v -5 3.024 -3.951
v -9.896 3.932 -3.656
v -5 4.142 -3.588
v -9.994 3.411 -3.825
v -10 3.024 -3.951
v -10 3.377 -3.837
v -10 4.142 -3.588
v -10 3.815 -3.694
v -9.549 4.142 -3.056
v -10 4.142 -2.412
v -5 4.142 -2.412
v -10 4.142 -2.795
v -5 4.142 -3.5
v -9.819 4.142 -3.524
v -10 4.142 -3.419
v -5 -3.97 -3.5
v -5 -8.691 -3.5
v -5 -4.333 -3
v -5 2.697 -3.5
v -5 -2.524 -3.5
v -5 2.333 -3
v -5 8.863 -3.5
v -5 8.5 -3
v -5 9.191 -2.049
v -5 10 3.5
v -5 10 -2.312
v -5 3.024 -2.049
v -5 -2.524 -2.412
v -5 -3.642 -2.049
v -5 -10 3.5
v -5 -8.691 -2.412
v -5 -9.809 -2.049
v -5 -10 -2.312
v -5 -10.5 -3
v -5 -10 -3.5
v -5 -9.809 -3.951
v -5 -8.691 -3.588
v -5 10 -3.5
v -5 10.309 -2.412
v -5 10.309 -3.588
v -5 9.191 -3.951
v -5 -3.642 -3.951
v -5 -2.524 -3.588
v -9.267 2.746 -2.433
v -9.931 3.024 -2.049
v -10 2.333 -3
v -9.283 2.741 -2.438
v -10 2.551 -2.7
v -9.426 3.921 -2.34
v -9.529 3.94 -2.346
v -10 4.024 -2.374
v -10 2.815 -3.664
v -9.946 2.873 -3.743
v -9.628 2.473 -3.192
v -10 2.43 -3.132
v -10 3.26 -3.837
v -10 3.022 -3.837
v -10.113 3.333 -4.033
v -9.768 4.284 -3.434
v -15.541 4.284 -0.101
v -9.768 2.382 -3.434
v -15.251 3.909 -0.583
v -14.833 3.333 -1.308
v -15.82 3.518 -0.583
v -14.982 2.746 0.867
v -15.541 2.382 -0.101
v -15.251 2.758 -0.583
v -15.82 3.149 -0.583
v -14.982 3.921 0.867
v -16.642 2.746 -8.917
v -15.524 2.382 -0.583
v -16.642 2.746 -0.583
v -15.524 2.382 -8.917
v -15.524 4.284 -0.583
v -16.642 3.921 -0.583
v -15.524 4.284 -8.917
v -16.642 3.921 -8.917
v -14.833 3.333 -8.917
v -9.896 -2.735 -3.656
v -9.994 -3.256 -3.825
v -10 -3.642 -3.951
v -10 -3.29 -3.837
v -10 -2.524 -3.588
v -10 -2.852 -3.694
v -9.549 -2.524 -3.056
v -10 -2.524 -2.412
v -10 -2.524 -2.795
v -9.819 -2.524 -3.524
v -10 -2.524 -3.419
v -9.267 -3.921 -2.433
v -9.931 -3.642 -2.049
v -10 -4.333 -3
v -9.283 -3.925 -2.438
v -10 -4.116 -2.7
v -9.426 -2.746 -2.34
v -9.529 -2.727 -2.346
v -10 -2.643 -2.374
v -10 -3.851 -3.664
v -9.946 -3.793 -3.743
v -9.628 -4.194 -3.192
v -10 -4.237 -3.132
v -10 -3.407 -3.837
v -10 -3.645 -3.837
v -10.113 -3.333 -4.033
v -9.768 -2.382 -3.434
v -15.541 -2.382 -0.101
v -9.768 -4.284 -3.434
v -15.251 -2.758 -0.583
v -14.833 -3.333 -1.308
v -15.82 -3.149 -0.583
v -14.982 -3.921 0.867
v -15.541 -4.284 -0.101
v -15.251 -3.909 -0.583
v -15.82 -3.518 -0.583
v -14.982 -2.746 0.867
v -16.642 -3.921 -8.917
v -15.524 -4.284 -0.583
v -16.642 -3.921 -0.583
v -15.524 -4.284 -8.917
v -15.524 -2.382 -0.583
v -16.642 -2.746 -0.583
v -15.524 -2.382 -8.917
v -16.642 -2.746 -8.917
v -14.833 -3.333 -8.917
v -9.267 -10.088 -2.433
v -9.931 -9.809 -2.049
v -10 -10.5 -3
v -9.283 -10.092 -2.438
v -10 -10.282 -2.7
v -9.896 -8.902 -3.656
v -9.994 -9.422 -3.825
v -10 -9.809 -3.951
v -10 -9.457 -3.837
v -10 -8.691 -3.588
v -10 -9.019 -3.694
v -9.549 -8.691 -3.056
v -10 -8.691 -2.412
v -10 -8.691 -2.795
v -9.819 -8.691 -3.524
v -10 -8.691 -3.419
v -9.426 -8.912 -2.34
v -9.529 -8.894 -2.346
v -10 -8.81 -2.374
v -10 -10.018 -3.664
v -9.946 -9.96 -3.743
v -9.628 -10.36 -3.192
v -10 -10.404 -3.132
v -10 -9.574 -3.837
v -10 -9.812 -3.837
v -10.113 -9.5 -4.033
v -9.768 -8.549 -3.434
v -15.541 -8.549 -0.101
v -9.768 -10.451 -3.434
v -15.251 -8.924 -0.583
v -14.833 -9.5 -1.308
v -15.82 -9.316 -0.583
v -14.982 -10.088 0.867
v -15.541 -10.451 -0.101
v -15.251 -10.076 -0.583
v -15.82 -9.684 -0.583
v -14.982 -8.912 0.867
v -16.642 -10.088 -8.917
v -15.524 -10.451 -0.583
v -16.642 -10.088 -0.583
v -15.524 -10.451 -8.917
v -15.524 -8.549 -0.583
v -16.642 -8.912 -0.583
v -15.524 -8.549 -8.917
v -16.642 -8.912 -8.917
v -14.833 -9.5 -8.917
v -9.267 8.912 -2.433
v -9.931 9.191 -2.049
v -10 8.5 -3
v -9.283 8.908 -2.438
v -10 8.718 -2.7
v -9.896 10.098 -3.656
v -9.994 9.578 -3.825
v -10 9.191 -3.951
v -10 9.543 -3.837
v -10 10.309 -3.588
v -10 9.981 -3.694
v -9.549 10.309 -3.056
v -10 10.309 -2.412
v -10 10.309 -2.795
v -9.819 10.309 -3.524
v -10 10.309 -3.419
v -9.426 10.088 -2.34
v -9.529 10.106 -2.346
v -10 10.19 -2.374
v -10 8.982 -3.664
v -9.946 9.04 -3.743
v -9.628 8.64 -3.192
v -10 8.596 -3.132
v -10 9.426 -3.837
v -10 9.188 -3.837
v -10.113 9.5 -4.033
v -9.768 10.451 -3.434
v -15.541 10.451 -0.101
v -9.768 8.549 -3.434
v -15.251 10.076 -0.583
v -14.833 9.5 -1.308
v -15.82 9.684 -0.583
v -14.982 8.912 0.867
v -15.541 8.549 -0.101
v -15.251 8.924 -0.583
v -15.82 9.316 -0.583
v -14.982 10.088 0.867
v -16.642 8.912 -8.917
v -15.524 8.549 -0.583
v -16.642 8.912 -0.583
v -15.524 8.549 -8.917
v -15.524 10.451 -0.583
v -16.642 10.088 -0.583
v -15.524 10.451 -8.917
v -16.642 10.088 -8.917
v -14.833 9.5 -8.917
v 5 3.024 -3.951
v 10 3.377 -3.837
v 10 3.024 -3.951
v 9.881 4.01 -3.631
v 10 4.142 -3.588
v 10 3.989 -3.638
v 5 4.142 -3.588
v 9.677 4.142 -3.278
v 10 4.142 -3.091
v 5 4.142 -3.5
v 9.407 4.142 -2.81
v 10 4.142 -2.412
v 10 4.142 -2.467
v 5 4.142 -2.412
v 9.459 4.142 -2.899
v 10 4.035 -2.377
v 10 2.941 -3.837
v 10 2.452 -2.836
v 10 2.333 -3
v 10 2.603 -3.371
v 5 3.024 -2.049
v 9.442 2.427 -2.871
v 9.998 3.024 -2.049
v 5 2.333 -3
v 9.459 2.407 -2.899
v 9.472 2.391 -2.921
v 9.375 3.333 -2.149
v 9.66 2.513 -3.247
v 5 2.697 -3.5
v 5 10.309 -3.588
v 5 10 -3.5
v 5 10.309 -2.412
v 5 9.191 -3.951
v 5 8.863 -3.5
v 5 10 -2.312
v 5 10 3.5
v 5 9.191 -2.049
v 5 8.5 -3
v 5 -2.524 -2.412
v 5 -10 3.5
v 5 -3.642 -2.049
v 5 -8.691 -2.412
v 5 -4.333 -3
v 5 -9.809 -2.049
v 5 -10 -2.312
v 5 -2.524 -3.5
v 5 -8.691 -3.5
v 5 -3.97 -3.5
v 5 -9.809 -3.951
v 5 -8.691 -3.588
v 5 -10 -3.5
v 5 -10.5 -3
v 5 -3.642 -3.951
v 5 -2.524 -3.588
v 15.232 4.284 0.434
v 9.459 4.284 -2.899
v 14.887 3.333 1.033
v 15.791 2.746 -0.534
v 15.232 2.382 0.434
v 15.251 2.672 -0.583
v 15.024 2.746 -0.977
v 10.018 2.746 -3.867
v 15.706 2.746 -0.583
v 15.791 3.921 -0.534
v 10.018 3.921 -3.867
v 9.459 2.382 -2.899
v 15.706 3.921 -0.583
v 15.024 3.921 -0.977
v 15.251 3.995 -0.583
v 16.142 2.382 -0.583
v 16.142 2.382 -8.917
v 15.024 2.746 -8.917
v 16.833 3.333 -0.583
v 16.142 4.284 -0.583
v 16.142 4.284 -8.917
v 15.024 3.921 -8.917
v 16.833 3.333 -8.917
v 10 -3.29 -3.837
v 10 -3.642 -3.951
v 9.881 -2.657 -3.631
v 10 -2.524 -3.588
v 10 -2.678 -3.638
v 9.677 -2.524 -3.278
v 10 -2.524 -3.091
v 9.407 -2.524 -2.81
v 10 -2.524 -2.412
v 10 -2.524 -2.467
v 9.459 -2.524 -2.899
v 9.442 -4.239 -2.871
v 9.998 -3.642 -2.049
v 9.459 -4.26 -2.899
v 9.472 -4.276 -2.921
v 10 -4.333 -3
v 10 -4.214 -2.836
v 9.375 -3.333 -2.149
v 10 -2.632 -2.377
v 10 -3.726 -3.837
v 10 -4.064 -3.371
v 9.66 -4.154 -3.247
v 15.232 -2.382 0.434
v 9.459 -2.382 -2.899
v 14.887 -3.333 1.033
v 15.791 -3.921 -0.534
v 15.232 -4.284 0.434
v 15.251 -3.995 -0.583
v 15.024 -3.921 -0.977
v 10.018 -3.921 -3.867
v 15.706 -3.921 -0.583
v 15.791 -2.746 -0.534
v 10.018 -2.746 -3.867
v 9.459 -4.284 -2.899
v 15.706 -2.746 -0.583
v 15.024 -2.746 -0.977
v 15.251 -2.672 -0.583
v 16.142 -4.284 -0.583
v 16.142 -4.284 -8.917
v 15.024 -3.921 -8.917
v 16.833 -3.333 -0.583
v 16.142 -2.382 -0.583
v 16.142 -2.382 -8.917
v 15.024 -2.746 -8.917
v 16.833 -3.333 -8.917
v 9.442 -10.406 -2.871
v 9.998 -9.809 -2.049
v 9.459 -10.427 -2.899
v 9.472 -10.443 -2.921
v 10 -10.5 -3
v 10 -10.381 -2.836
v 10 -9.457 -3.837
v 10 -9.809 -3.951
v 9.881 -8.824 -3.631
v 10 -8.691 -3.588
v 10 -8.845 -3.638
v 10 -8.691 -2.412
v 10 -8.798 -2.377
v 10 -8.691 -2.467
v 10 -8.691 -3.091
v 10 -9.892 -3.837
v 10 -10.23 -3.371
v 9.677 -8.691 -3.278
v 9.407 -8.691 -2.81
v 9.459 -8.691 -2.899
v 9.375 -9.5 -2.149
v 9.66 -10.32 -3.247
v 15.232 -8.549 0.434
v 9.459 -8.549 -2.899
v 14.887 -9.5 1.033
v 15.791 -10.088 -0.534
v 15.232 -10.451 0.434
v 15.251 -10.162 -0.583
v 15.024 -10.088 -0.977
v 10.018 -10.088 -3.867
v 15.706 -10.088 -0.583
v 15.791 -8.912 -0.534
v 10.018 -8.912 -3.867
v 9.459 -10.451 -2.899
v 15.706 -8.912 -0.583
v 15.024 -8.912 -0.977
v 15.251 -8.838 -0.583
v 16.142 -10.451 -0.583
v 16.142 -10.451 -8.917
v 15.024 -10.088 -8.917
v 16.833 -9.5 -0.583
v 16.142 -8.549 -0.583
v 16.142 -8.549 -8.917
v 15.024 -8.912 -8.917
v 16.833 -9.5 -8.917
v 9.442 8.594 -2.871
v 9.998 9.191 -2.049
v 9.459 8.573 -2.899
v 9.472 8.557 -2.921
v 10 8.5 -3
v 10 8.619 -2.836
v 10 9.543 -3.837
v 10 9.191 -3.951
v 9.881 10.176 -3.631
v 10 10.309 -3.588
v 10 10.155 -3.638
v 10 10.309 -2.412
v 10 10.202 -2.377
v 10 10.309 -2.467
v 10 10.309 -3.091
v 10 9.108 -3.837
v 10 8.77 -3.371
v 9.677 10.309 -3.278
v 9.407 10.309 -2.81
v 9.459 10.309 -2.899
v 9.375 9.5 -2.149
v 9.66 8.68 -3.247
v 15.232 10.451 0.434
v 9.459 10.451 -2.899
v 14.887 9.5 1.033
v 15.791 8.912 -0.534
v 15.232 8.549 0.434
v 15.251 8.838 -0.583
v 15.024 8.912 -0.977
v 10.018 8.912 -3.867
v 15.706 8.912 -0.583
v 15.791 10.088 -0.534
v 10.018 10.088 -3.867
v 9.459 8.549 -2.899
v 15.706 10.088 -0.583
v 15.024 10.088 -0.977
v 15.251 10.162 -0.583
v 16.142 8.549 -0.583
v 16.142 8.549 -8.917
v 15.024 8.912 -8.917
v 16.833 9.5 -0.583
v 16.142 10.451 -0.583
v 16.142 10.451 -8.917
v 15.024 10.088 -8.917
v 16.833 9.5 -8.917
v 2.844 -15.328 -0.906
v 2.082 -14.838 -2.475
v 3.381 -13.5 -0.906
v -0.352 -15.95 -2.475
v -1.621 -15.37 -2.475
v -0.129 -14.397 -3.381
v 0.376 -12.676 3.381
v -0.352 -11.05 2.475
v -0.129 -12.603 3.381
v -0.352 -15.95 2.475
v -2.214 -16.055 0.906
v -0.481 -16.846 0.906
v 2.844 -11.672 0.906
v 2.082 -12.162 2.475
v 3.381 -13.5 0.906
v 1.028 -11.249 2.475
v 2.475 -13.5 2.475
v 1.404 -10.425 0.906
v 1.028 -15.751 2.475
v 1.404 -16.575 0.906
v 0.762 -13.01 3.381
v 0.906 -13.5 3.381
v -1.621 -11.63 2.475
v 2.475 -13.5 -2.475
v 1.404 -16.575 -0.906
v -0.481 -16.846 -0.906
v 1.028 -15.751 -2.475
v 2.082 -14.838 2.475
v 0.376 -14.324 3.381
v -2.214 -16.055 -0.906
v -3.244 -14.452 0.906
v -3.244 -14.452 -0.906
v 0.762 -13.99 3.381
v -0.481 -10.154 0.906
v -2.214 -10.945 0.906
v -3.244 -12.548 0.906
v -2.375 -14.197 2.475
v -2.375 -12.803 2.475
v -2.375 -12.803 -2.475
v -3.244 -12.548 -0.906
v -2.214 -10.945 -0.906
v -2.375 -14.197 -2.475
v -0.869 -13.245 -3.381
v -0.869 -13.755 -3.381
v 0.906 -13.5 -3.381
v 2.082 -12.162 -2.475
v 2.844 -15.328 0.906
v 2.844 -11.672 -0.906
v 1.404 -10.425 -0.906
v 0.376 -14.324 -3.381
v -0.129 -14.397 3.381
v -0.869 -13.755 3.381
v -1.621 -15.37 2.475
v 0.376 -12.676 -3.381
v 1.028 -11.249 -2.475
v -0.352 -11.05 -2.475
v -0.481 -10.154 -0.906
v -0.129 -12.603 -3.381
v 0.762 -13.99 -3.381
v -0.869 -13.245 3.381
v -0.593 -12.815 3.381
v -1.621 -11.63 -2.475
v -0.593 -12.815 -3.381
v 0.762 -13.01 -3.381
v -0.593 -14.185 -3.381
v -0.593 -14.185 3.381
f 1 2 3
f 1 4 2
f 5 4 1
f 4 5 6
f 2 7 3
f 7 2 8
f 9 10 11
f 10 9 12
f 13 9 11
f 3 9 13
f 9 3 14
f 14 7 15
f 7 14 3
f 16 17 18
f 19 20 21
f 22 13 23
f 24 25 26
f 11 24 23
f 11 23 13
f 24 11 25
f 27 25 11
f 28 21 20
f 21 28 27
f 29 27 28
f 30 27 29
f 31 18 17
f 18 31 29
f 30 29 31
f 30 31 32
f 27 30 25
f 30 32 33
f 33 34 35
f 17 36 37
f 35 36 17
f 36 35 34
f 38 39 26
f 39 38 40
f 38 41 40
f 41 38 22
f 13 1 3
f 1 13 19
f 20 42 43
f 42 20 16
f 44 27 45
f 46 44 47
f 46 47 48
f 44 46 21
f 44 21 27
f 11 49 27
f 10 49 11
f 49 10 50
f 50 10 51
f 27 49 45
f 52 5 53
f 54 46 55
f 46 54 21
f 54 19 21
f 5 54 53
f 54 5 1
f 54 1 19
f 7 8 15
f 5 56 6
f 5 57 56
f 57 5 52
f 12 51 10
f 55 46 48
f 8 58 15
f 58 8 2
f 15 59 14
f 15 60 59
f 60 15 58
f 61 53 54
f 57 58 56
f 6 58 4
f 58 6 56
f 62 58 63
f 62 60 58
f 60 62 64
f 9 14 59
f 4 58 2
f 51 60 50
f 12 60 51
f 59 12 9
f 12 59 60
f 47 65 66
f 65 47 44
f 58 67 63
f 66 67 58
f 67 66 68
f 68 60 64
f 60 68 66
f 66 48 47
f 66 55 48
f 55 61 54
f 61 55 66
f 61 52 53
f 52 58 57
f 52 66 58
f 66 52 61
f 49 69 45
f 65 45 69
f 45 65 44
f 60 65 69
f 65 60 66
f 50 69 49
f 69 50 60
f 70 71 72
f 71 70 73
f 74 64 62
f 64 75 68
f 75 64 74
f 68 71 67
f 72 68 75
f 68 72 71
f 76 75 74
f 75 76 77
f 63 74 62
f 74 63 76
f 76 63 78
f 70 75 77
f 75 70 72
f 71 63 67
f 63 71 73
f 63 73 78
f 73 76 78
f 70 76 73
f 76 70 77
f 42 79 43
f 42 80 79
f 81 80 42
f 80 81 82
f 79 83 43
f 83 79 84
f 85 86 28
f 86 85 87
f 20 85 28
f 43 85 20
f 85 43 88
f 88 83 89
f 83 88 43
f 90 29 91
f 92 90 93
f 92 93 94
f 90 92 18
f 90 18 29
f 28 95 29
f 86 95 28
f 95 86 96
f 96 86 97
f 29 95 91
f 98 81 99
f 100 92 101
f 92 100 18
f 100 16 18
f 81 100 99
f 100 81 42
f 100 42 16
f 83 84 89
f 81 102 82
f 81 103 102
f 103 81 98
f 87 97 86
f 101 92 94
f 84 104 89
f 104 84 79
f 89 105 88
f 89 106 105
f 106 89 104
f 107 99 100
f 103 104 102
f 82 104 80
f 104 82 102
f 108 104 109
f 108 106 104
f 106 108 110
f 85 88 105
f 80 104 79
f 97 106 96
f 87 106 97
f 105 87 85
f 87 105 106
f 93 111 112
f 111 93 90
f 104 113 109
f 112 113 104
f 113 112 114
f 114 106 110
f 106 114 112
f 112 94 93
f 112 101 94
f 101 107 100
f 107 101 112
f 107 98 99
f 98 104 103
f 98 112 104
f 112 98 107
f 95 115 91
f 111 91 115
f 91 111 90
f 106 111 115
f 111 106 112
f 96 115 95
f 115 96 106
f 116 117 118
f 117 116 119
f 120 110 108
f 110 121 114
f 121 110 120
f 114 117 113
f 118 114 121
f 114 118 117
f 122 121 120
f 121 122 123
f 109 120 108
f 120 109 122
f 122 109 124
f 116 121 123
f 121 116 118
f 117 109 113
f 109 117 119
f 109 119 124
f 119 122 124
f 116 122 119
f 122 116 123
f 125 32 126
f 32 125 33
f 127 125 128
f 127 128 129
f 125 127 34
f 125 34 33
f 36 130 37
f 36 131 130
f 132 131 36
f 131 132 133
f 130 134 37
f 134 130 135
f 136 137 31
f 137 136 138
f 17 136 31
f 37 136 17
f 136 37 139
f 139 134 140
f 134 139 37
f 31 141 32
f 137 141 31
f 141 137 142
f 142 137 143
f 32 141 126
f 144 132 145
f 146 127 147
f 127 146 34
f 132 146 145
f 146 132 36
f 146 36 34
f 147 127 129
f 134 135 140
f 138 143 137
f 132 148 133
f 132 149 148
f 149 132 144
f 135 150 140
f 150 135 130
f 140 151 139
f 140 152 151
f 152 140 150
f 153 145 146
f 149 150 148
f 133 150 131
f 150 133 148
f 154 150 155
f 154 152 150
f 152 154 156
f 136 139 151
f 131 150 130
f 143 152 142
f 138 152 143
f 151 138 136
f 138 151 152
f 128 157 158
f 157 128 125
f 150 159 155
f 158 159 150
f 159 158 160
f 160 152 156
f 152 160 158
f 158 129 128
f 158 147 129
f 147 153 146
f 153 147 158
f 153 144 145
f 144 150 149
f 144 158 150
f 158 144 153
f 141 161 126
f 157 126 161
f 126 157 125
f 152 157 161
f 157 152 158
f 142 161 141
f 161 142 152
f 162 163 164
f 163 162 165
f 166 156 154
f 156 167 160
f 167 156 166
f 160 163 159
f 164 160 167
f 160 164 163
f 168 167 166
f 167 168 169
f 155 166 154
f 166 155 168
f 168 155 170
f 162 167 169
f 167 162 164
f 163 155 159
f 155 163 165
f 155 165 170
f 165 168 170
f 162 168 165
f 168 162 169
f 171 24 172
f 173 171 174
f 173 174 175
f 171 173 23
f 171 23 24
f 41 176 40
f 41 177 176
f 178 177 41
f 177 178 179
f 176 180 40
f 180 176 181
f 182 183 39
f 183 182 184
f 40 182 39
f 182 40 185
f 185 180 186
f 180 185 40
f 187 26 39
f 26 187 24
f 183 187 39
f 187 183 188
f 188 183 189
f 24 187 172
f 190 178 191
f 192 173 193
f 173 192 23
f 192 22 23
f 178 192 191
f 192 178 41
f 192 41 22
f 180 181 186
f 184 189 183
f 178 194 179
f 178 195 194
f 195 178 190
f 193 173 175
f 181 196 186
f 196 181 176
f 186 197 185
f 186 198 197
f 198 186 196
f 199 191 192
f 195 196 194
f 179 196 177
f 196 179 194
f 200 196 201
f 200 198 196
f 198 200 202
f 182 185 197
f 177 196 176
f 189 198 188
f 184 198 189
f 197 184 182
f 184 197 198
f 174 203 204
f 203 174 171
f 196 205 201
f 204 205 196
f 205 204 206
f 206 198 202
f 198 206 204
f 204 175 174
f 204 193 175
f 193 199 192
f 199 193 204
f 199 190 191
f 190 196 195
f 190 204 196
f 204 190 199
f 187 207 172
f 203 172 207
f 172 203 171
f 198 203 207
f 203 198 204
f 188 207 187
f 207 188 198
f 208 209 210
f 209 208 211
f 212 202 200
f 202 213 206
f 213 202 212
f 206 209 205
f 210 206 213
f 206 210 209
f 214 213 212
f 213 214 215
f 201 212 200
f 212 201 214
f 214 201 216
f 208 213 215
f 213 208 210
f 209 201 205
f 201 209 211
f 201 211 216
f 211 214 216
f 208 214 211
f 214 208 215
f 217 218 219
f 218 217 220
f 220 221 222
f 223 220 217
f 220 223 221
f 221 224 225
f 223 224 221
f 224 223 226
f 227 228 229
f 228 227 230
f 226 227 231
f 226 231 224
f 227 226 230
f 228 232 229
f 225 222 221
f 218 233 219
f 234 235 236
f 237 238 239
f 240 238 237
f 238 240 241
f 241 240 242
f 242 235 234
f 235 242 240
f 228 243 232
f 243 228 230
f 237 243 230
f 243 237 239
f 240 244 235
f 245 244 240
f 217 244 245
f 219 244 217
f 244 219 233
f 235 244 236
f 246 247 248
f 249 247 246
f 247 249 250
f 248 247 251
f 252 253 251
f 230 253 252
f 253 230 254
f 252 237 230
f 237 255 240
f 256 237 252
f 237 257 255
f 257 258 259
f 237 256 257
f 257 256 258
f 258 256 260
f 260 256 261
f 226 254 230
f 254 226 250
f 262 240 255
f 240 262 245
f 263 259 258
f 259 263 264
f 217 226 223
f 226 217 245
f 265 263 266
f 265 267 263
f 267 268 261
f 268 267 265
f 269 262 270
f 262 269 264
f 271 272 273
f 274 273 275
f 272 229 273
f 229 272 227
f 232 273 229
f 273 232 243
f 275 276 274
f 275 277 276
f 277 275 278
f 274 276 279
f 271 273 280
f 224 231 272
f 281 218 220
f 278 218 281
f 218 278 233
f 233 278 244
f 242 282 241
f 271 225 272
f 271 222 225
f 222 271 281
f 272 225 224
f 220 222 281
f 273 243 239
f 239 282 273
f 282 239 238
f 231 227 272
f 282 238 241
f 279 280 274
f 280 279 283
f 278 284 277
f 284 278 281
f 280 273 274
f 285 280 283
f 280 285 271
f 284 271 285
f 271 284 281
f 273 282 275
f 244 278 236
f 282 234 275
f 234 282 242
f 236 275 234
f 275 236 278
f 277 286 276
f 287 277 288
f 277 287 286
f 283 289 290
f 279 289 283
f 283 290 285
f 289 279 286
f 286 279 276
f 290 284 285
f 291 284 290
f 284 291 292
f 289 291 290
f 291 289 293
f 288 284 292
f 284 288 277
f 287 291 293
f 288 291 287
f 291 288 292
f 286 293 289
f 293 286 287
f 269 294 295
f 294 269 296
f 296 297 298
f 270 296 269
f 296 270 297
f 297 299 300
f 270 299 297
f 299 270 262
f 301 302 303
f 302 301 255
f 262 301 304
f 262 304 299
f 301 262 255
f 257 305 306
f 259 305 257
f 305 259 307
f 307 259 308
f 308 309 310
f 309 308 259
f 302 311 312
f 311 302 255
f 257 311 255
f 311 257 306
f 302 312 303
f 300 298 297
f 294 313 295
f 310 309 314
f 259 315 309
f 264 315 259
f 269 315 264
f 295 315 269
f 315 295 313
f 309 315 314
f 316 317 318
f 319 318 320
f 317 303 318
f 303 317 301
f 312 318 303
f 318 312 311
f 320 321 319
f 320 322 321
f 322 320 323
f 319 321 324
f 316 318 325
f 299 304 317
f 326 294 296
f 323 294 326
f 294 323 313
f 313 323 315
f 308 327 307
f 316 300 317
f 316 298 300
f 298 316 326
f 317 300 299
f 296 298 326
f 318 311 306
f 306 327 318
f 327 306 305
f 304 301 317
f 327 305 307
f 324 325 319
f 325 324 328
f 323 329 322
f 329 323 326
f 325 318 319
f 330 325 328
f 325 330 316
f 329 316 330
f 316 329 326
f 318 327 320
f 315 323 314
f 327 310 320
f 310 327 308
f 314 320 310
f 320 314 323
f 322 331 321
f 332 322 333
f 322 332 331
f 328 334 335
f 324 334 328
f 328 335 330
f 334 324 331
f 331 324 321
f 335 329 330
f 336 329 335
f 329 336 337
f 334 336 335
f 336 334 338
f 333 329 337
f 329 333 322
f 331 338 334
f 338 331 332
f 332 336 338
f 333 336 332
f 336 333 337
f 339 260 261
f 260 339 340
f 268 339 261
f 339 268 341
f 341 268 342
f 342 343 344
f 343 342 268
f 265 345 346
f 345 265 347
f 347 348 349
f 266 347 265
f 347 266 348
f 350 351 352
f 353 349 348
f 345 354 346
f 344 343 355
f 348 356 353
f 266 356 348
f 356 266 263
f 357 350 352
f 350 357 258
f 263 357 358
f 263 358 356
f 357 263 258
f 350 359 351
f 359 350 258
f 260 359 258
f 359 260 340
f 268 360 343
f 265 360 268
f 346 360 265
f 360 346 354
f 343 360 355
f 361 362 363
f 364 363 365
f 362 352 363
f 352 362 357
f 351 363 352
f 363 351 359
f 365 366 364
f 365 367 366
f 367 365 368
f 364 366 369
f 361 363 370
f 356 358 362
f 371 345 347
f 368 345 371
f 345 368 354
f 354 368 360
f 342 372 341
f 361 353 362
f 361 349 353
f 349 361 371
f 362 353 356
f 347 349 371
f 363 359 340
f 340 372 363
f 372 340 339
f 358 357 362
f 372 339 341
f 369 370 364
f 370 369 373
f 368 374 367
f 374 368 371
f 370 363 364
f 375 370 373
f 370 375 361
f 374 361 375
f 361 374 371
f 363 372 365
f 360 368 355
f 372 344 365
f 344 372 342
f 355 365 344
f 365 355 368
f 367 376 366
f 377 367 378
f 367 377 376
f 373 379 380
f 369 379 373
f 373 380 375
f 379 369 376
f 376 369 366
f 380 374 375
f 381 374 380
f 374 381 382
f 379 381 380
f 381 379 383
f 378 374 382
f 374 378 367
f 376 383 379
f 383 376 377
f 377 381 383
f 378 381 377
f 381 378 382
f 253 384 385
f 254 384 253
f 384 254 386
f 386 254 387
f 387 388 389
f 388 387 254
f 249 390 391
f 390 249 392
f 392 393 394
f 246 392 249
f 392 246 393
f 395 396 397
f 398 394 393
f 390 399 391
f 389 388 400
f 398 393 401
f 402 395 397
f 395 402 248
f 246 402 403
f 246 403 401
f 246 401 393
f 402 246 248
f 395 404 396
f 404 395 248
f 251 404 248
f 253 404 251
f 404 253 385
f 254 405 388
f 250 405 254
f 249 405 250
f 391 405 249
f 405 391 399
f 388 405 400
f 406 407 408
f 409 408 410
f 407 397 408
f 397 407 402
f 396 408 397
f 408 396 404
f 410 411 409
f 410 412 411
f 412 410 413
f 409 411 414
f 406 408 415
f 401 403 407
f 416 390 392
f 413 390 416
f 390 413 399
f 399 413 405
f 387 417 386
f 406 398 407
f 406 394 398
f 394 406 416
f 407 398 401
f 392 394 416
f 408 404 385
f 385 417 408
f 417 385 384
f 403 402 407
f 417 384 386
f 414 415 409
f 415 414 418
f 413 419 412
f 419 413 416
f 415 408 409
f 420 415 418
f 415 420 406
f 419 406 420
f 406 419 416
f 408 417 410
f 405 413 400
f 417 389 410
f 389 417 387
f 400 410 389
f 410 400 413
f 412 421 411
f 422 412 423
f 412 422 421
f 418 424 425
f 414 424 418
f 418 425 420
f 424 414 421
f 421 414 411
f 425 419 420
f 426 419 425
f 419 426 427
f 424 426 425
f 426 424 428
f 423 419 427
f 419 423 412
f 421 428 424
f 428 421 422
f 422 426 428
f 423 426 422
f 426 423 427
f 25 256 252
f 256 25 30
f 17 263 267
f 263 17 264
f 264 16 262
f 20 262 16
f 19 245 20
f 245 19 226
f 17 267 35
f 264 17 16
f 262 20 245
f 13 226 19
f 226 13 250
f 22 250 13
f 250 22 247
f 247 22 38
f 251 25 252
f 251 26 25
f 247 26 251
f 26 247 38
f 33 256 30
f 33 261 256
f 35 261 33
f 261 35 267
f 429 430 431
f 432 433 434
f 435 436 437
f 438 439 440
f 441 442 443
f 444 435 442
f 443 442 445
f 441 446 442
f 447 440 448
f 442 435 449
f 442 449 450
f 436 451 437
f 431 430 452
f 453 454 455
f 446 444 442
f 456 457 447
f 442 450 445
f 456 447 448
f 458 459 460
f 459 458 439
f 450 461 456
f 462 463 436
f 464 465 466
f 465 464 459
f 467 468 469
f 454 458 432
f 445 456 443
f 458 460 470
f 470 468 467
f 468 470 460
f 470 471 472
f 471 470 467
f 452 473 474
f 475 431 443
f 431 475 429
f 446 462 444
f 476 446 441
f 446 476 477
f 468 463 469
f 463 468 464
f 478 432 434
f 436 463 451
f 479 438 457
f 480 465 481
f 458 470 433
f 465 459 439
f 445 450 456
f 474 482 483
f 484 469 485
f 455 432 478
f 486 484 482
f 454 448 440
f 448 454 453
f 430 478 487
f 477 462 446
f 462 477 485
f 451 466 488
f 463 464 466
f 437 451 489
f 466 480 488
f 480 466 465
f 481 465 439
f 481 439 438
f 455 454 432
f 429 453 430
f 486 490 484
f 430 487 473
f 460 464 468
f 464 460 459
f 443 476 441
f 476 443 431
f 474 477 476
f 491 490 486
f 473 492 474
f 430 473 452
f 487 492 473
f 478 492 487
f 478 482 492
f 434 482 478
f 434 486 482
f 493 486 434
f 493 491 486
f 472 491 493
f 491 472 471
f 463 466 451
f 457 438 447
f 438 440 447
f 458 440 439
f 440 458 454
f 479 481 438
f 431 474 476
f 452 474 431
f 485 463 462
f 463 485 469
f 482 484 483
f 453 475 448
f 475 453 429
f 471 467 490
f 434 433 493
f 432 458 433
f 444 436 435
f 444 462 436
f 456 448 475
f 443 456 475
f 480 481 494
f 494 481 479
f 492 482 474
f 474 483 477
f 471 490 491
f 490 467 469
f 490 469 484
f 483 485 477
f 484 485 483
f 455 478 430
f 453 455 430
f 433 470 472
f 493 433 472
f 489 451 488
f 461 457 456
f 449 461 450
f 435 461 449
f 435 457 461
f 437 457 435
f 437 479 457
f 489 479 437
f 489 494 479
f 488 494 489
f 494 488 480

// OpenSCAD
// Generated by SolidPython 0.4.2 on 2020-05-17 23:30:11


union() {
	color(c = [0.2000000000, 0.2000000000, 0.2000000000]) {
		cube(center = true, size = [10, 20, 7]);
	}
	translate(v = [0, -13.5000000000, 0]) {
		color(c = [0.2000000000, 0.2000000000, 0.2000000000]) {
			sphere(r = 3.5000000000);
		}
	}
	union() {
		translate(v = [0, 9.5000000000, 0]) {
			translate(v = [-7.5000000000, 0, 0]) {
				translate(v = [0, 0, -3.0000000000]) {
					rotate(a = 120, v = [1, -1, -1]) {
						color(c = [0.2000000000, 0.2000000000, 0.2000000000]) {
							cylinder(center = true, h = 5.0000000000, r = 1);
						}
					}
				}
			}
		}
		translate(v = [0, 9.5000000000, 0]) {
			translate(v = [-12.5000000000, 0, 0]) {
				translate(v = [0, 0, -1.5000000000]) {
					rotate(a = 120, v = [0, 1, 0]) {
						color(c = [0.2000000000, 0.2000000000, 0.2000000000]) {
							cylinder(center = true, h = 6.6666666667, r = 1);
						}
					}
				}
			}
		}
		translate(v = [0, 9.5000000000, 0]) {
			translate(v = [-15.8333333333, 0, 0]) {
				translate(v = [0, 0, -4.7500000000]) {
					rotate(a = 0, v = [-1, -1, 1]) {
						color(c = [0.2000000000, 0.2000000000, 0.2000000000]) {
							cylinder(center = true, h = 8.3333333333, r = 1);
						}
					}
				}
			}
		}
		union() {
			translate(v = [0, 3.3333333333, 0]) {
				translate(v = [-7.5000000000, 0, 0]) {
					translate(v = [0, 0, -3.0000000000]) {
						rotate(a = 120, v = [1, -1, -1]) {
							color(c = [0.2000000000, 0.2000000000, 0.2000000000]) {
								cylinder(center = true, h = 5.0000000000, r = 1);
							}
						}
					}
				}
			}
			translate(v = [0, 3.3333333333, 0]) {
				translate(v = [-12.5000000000, 0, 0]) {
					translate(v = [0, 0, -1.5000000000]) {
						rotate(a = 120, v = [0, 1, 0]) {
							color(c = [0.2000000000, 0.2000000000, 0.2000000000]) {
								cylinder(center = true, h = 6.6666666667, r = 1);
							}
						}
					}
				}
			}
			translate(v = [0, 3.3333333333, 0]) {
				translate(v = [-15.8333333333, 0, 0]) {
					translate(v = [0, 0, -4.7500000000]) {
						rotate(a = 0, v = [-1, -1, 1]) {
							color(c = [0.2000000000, 0.2000000000, 0.2000000000]) {
								cylinder(center = true, h = 8.3333333333, r = 1);
							}
						}
					}
				}
			}
		}
		union() {
			translate(v = [0, -3.3333333333, 0]) {
				translate(v = [-7.5000000000, 0, 0]) {
					translate(v = [0, 0, -3.0000000000]) {
						rotate(a = 120, v = [1, -1, -1]) {
							color(c = [0.2000000000, 0.2000000000, 0.2000000000]) {
								cylinder(center = true, h = 5.0000000000, r = 1);
							}
						}
					}
				}
			}
			translate(v = [0, -3.3333333333, 0]) {
				translate(v = [-12.5000000000, 0, 0]) {
					translate(v = [0, 0, -1.5000000000]) {
						rotate(a = 120, v = [0, 1, 0]) {
							color(c = [0.2000000000, 0.2000000000, 0.2000000000]) {
								cylinder(center = true, h = 6.6666666667, r = 1);
							}
						}
					}
				}
			}
			translate(v = [0, -3.3333333333, 0]) {
				translate(v = [-15.8333333333, 0, 0]) {
					translate(v = [0, 0, -4.7500000000]) {
						rotate(a = 0, v = [-1, -1, 1]) {
							color(c = [0.2000000000, 0.2000000000, 0.2000000000]) {
								cylinder(center = true, h = 8.3333333333, r = 1);
							}
						}
					}
				}
			}
		}
		union() {
			translate(v = [0, -9.5000000000, 0]) {
				translate(v = [-7.5000000000, 0, 0]) {
					translate(v = [0, 0, -3.0000000000]) {
						rotate(a = 120, v = [1, -1, -1]) {
							color(c = [0.2000000000, 0.2000000000, 0.2000000000]) {
								cylinder(center = true, h = 5.0000000000, r = 1);
							}
						}
					}
				}
			}
			translate(v = [0, -9.5000000000, 0]) {
				translate(v = [-12.5000000000, 0, 0]) {
					translate(v = [0, 0, -1.5000000000]) {
						rotate(a = 120, v = [0, 1, 0]) {
							color(c = [0.2000000000, 0.2000000000, 0.2000000000]) {
								cylinder(center = true, h = 6.6666666667, r = 1);
							}
						}
					}
				}
			}
			translate(v = [0, -9.5000000000, 0]) {
				translate(v = [-15.8333333333, 0, 0]) {
					translate(v = [0, 0, -4.7500000000]) {
						rotate(a = 0, v = [-1, -1, 1]) {
							color(c = [0.2000000000, 0.2000000000, 0.2000000000]) {
								cylinder(center = true, h = 8.3333333333, r = 1);
							}
						}
					}
				}
			}
		}
	}
	union() {
		translate(v = [0, 9.5000000000, 0]) {
			translate(v = [7.5000000000, 0, 0]) {
				translate(v = [0, 0, -3.0000000000]) {
					rotate(a = 120, v = [1, -1, -1]) {
						color(c = [0.2000000000, 0.2000000000, 0.2000000000]) {
							cylinder(center = true, h = 5.0000000000, r = 1);
						}
					}
				}
			}
		}
		translate(v = [0, 9.5000000000, 0]) {
			translate(v = [12.5000000000, 0, 0]) {
				translate(v = [0, 0, -1.5000000000]) {
					rotate(a = 120, v = [0, -1, 0]) {
						color(c = [0.2000000000, 0.2000000000, 0.2000000000]) {
							cylinder(center = true, h = 6.6666666667, r = 1);
						}
					}
				}
			}
		}
		translate(v = [0, 9.5000000000, 0]) {
			translate(v = [15.8333333333, 0, 0]) {
				translate(v = [0, 0, -4.7500000000]) {
					rotate(a = 0, v = [-1, -1, 1]) {
						color(c = [0.2000000000, 0.2000000000, 0.2000000000]) {
							cylinder(center = true, h = 8.3333333333, r = 1);
						}
					}
				}
			}
		}
		union() {
			translate(v = [0, 3.3333333333, 0]) {
				translate(v = [7.5000000000, 0, 0]) {
					translate(v = [0, 0, -3.0000000000]) {
						rotate(a = 120, v = [1, -1, -1]) {
							color(c = [0.2000000000, 0.2000000000, 0.2000000000]) {
								cylinder(center = true, h = 5.0000000000, r = 1);
							}
						}
					}
				}
			}
			translate(v = [0, 3.3333333333, 0]) {
				translate(v = [12.5000000000, 0, 0]) {
					translate(v = [0, 0, -1.5000000000]) {
						rotate(a = 120, v = [0, -1, 0]) {
							color(c = [0.2000000000, 0.2000000000, 0.2000000000]) {
								cylinder(center = true, h = 6.6666666667, r = 1);
							}
						}
					}
				}
			}
			translate(v = [0, 3.3333333333, 0]) {
				translate(v = [15.8333333333, 0, 0]) {
					translate(v = [0, 0, -4.7500000000]) {
						rotate(a = 0, v = [-1, -1, 1]) {
							color(c = [0.2000000000, 0.2000000000, 0.2000000000]) {
								cylinder(center = true, h = 8.3333333333, r = 1);
							}
						}
					}
				}
			}
		}
		union() {
			translate(v = [0, -3.3333333333, 0]) {
				translate(v = [7.5000000000, 0, 0]) {
					translate(v = [0, 0, -3.0000000000]) {
						rotate(a = 120, v = [1, -1, -1]) {
							color(c = [0.2000000000, 0.2000000000, 0.2000000000]) {
								cylinder(center = true, h = 5.0000000000, r = 1);
							}
						}
					}
				}
			}
			translate(v = [0, -3.3333333333, 0]) {
				translate(v = [12.5000000000, 0, 0]) {
					translate(v = [0, 0, -1.5000000000]) {
						rotate(a = 120, v = [0, -1, 0]) {
							color(c = [0.2000000000, 0.2000000000, 0.2000000000]) {
								cylinder(center = true, h = 6.6666666667, r = 1);
							}
						}
					}
				}
			}
			translate(v = [0, -3.3333333333, 0]) {
				translate(v = [15.8333333333, 0, 0]) {
					translate(v = [0, 0, -4.7500000000]) {
						rotate(a = 0, v = [-1, -1, 1]) {
							color(c = [0.2000000000, 0.2000000000, 0.2000000000]) {
								cylinder(center = true, h = 8.3333333333, r = 1);
							}
						}
					}
				}
			}
		}
		union() {
			translate(v = [0, -9.5000000000, 0]) {
				translate(v = [7.5000000000, 0, 0]) {
					translate(v = [0, 0, -3.0000000000]) {
						rotate(a = 120, v = [1, -1, -1]) {
							color(c = [0.2000000000, 0.2000000000, 0.2000000000]) {
								cylinder(center = true, h = 5.0000000000, r = 1);
							}
						}
					}
				}
			}
			translate(v = [0, -9.5000000000, 0]) {
				translate(v = [12.5000000000, 0, 0]) {
					translate(v = [0, 0, -1.5000000000]) {
						rotate(a = 120, v = [0, -1, 0]) {
							color(c = [0.2000000000, 0.2000000000, 0.2000000000]) {
								cylinder(center = true, h = 6.6666666667, r = 1);
							}
						}
					}
				}
			}
			translate(v = [0, -9.5000000000, 0]) {
				translate(v = [15.8333333333, 0, 0]) {
					translate(v = [0, 0, -4.7500000000]) {
						rotate(a = 0, v = [-1, -1, 1]) {
							color(c = [0.2000000000, 0.2000000000, 0.2000000000]) {
								cylinder(center = true, h = 8.3333333333, r = 1);
							}
						}
					}
				}
			}
		}
	}
}
/***********************************************
*********      SolidPython code:      **********
************************************************
 
import argparse
from solid.utils import *

def create_spider(args):
    w_body = args.get('w_body')
    l_body = args.get('l_body')
    h_body = args.get('h_body')

    leg_length = args.get('leg_length')
    cube_main = color(BlackPaint)(cube([w_body, l_body, h_body], center=True))
    s_of = l_body/2 + h_body/2
    sphere_back = back(s_of)(color(BlackPaint)(sphere(r=h_body/2)))

    leg_p1_so = w_body/2 + leg_length/8
    leg_p2_so = w_body/2 + leg_length/8 + leg_length/4
    leg_p3_so = w_body/2 + leg_length/8 + leg_length/4 + leg_length/6

    leg_p1_d = h_body/2 - 1/2
    leg_p2_d = h_body/2 - 2
    leg_p3_d = h_body/2 + leg_length/16

    leg14_fb = l_body/2 - 1/2
    leg23_fb = l_body/2 - l_body/3

    leg1_cyl = cylinder(r=1, h=leg_length/4, center=True)
    leg_p1 = rotate(a=120, v=(1, -1, -1))(color(BlackPaint)(leg1_cyl))
    leg2_cyl = cylinder(r=1, h=leg_length/3, center=True)
    leg_p2 = rotate(a=120, v=(0, -1, 0))(color(BlackPaint)(leg2_cyl))
    leg3_cyl = cylinder(r=1, h=leg_length*5/12, center=True)
    leg_p3 = rotate(a=0, v=(-1, -1, 1))(color(BlackPaint)(leg3_cyl))
    
    leg1_cyl = cylinder(r=1, h=leg_length/4, center=True)
    leg_p1 = rotate(a=120, v=(1, -1, -1))(color(BlackPaint)(leg1_cyl))
    leg2_cyl = cylinder(r=1, h=leg_length/3, center=True)
    leg_p2 = rotate(a=120, v=(0, -1, 0))(color(BlackPaint)(leg2_cyl))
    leg3_cyl = cylinder(r=1, h=leg_length*5/12, center=True)
    leg_p3 = rotate(a=0, v=(-1, -1, 1))(color(BlackPaint)(leg3_cyl))
    
    leg_p2l = rotate(a=120, v=(0, 1, 0))(color(BlackPaint)(leg2_cyl))

    rleg1_p1 = forward(leg14_fb)(right(leg_p1_so)(down(leg_p1_d)(leg_p1)))
    rleg1_p2 = forward(leg14_fb)(right(leg_p2_so)(down(leg_p2_d)(leg_p2)))
    rleg1_p3 = forward(leg14_fb)(right(leg_p3_so)(down(leg_p3_d)(leg_p3)))
    rleg1 = rleg1_p1 + rleg1_p2 + rleg1_p3

    rleg2_p1 = forward(leg23_fb)(right(leg_p1_so)(down(leg_p1_d)(leg_p1)))
    rleg2_p2 = forward(leg23_fb)(right(leg_p2_so)(down(leg_p2_d)(leg_p2)))
    rleg2_p3 = forward(leg23_fb)(right(leg_p3_so)(down(leg_p3_d)(leg_p3)))
    rleg2 = rleg2_p1 + rleg2_p2 + rleg2_p3

    rleg3_p1 = back(leg23_fb)(right(leg_p1_so)(down(leg_p1_d)(leg_p1)))
    rleg3_p2 = back(leg23_fb)(right(leg_p2_so)(down(leg_p2_d)(leg_p2)))
    rleg3_p3 = back(leg23_fb)(right(leg_p3_so)(down(leg_p3_d)(leg_p3)))
    rleg3 = rleg3_p1 + rleg3_p2 + rleg3_p3

    rleg4_p1 = back(leg14_fb)(right(leg_p1_so)(down(leg_p1_d)(leg_p1)))
    rleg4_p2 = back(leg14_fb)(right(leg_p2_so)(down(leg_p2_d)(leg_p2)))
    rleg4_p3 = back(leg14_fb)(right(leg_p3_so)(down(leg_p3_d)(leg_p3)))
    rleg4 = rleg4_p1 + rleg4_p2 + rleg4_p3

    lleg1_p1 = forward(leg14_fb)(left(leg_p1_so)(down(leg_p1_d)(leg_p1)))
    lleg1_p2 = forward(leg14_fb)(left(leg_p2_so)(down(leg_p2_d)(leg_p2l)))
    lleg1_p3 = forward(leg14_fb)(left(leg_p3_so)(down(leg_p3_d)(leg_p3)))
    lleg1 = lleg1_p1 + lleg1_p2 + lleg1_p3

    lleg2_p1 = forward(leg23_fb)(left(leg_p1_so)(down(leg_p1_d)(leg_p1)))
    lleg2_p2 = forward(leg23_fb)(left(leg_p2_so)(down(leg_p2_d)(leg_p2l)))
    lleg2_p3 = forward(leg23_fb)(left(leg_p3_so)(down(leg_p3_d)(leg_p3)))
    lleg2 = lleg2_p1 + lleg2_p2 + lleg2_p3

    lleg3_p1 = back(leg23_fb)(left(leg_p1_so)(down(leg_p1_d)(leg_p1)))
    lleg3_p2 = back(leg23_fb)(left(leg_p2_so)(down(leg_p2_d)(leg_p2l)))
    lleg3_p3 = back(leg23_fb)(left(leg_p3_so)(down(leg_p3_d)(leg_p3)))
    lleg3 = lleg3_p1 + lleg3_p2 + lleg3_p3

    lleg4_p1 = back(leg14_fb)(left(leg_p1_so)(down(leg_p1_d)(leg_p1)))
    lleg4_p2 = back(leg14_fb)(left(leg_p2_so)(down(leg_p2_d)(leg_p2l)))
    lleg4_p3 = back(leg14_fb)(left(leg_p3_so)(down(leg_p3_d)(leg_p3)))
    lleg4 = lleg4_p1 + lleg4_p2 + lleg4_p3

    left_legs = lleg1 + lleg2 + lleg3 + lleg4
    right_legs = rleg1 + rleg2 + rleg3 + rleg4

    spider = cube_main + sphere_back + left_legs + right_legs
    scad_render_to_file(spider, './file_out.scad')

if __name__ == '__main__':
    parser = argparse.ArgumentParser(description='Please specify body measurements and leg length')
    parser.add_argument('w_body', metavar='w_body', type=int, nargs='?', default=10, help='body height')
    parser.add_argument('h_body', metavar='h_body', type=int, nargs='?', default=7, help='body width')
    parser.add_argument('l_body', metavar='l_body', type=int, nargs='?', default=20, help='body length')
    parser.add_argument('leg_length', metavar='leg_length', type=int, nargs='?', default=20, help='leg length')
    args = parser.parse_args()

    create_spider(vars(args)) 
 
************************************************/
